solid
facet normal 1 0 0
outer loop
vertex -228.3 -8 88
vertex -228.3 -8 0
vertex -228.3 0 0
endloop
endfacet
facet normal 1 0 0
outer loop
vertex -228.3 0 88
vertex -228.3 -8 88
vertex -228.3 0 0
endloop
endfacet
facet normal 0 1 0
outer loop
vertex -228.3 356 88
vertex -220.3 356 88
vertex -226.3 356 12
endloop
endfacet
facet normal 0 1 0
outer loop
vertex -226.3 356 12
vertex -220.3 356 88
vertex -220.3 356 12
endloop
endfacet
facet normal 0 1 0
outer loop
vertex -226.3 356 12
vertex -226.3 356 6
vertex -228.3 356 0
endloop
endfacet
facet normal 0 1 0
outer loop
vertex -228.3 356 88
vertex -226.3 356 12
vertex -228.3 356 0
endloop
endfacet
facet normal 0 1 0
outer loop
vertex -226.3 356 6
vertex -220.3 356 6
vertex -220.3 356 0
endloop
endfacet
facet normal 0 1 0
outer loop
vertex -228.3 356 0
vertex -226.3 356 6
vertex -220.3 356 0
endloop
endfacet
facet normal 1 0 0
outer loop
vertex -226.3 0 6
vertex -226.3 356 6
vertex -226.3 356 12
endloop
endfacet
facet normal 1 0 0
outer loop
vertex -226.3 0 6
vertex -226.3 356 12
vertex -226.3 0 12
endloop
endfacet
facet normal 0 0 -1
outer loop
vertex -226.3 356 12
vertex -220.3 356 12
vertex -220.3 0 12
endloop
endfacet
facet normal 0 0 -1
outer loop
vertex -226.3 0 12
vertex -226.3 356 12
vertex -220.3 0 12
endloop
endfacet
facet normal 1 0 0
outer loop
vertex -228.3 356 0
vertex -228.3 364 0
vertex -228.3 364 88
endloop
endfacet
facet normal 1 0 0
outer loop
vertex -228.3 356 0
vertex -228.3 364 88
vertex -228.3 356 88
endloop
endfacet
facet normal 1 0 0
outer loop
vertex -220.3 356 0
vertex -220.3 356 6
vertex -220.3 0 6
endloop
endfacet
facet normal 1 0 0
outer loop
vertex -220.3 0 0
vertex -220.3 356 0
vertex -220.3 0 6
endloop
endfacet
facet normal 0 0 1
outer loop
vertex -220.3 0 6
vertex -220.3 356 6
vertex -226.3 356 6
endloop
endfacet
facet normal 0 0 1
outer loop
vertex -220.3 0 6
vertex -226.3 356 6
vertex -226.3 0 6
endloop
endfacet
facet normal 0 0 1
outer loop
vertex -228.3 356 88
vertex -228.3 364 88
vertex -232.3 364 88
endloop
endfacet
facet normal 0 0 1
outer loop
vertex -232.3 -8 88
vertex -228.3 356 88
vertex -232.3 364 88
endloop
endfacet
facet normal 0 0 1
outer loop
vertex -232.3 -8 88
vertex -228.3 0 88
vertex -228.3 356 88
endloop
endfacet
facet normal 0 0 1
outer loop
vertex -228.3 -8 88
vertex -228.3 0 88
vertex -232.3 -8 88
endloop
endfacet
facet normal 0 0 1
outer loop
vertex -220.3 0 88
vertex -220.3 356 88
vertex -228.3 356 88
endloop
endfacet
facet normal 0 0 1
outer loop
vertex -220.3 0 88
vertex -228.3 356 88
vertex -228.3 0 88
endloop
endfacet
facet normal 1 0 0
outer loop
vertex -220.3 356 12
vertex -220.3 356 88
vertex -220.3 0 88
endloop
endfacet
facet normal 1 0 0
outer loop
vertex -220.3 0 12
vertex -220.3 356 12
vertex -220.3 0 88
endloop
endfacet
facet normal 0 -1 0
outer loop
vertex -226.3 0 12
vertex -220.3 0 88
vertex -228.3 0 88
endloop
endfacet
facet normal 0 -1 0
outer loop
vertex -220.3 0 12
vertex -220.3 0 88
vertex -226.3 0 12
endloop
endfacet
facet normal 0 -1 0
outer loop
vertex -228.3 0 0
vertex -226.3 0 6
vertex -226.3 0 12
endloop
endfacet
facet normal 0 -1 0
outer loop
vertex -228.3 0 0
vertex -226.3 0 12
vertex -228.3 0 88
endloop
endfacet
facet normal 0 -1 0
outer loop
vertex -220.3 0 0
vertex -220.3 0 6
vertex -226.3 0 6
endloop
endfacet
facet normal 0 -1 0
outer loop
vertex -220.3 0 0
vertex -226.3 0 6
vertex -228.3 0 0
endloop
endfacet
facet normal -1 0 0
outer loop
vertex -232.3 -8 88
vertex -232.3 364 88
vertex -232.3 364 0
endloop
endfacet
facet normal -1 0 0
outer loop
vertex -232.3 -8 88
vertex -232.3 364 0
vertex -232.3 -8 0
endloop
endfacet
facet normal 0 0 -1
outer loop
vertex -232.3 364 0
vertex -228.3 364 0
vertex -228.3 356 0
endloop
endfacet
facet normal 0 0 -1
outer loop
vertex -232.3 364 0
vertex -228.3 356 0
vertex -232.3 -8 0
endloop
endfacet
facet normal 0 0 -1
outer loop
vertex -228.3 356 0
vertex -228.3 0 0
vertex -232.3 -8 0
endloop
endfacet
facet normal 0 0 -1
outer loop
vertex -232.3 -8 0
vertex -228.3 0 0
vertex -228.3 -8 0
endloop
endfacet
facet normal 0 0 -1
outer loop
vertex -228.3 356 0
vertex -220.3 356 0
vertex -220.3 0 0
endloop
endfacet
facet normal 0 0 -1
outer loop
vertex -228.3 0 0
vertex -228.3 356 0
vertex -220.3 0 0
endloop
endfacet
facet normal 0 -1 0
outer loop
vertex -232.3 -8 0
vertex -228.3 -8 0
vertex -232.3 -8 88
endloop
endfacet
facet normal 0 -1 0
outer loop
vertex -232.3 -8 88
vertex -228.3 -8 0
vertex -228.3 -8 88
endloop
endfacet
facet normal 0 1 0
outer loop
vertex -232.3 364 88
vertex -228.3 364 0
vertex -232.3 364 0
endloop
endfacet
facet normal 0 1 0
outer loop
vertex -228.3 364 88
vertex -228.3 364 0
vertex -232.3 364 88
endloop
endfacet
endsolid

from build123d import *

# Parameters (mm, degrees)
SKETCH062_W             = 372
SKETCH062_H             = 88
PAD023_DEPTH            = 12
SKETCH063_W             = 8
SKETCH063_H             = 88
POCKET038_DEPTH         = 8
SKETCH064_W             = 364
SKETCH064_H             = 6
POCKET039_DEPTH         = 6
BODY022_ROLL_ANGLE      = 90
BODY022_PLACEMENT_ANGLE = -90


with BuildPart() as part:
    # Sketch062 → Pad023 (new body)
    with BuildSketch(Plane.XY):
        with Locations((0, 44)):
            Rectangle(SKETCH062_W, SKETCH062_H)
    extrude(amount=PAD023_DEPTH)

    # Sketch063 (on Face5 of Pad023) → Pocket038 (cut)
    with BuildSketch(Plane(origin=(0, 0, 0), x_dir=(1, 0, 0), z_dir=(0, 0, -1))):
        with Locations((-182, -44)):
            Rectangle(SKETCH063_W, SKETCH063_H)
    pocket038 = extrude(amount=-POCKET038_DEPTH, mode=Mode.SUBTRACT)

    # Mirrored014: Pocket038 across Sketch063 V_Axis
    add(pocket038.mirror(Plane(origin=(0, 0, 0), x_dir=(0, 0, -1), z_dir=(1, 0, 0))), mode=Mode.SUBTRACT)

    # Sketch064 (on Face3 of Mirrored014) → Pocket039 (cut)
    with BuildSketch(Plane(origin=(0, 0, 0), x_dir=(1, 0, 0), z_dir=(0, 0, -1))):
        with Locations((0, -9)):
            Rectangle(SKETCH064_W, SKETCH064_H)
    extrude(amount=-POCKET039_DEPTH, mode=Mode.SUBTRACT)


with BuildPart() as part_1:
    # Body022 roll: moved
    add(part.part.rotate(Axis((0, 0, 0), (1, 0, 0)), BODY022_ROLL_ANGLE))


with BuildPart() as part_2:
    # Body022 placement: moved
    add(part_1.part.moved(Location((-220.3, 178, 0))).rotate(Axis((-220.3, 178, 0), (0, 0, 1)), BODY022_PLACEMENT_ANGLE))


solid = part_2.part
